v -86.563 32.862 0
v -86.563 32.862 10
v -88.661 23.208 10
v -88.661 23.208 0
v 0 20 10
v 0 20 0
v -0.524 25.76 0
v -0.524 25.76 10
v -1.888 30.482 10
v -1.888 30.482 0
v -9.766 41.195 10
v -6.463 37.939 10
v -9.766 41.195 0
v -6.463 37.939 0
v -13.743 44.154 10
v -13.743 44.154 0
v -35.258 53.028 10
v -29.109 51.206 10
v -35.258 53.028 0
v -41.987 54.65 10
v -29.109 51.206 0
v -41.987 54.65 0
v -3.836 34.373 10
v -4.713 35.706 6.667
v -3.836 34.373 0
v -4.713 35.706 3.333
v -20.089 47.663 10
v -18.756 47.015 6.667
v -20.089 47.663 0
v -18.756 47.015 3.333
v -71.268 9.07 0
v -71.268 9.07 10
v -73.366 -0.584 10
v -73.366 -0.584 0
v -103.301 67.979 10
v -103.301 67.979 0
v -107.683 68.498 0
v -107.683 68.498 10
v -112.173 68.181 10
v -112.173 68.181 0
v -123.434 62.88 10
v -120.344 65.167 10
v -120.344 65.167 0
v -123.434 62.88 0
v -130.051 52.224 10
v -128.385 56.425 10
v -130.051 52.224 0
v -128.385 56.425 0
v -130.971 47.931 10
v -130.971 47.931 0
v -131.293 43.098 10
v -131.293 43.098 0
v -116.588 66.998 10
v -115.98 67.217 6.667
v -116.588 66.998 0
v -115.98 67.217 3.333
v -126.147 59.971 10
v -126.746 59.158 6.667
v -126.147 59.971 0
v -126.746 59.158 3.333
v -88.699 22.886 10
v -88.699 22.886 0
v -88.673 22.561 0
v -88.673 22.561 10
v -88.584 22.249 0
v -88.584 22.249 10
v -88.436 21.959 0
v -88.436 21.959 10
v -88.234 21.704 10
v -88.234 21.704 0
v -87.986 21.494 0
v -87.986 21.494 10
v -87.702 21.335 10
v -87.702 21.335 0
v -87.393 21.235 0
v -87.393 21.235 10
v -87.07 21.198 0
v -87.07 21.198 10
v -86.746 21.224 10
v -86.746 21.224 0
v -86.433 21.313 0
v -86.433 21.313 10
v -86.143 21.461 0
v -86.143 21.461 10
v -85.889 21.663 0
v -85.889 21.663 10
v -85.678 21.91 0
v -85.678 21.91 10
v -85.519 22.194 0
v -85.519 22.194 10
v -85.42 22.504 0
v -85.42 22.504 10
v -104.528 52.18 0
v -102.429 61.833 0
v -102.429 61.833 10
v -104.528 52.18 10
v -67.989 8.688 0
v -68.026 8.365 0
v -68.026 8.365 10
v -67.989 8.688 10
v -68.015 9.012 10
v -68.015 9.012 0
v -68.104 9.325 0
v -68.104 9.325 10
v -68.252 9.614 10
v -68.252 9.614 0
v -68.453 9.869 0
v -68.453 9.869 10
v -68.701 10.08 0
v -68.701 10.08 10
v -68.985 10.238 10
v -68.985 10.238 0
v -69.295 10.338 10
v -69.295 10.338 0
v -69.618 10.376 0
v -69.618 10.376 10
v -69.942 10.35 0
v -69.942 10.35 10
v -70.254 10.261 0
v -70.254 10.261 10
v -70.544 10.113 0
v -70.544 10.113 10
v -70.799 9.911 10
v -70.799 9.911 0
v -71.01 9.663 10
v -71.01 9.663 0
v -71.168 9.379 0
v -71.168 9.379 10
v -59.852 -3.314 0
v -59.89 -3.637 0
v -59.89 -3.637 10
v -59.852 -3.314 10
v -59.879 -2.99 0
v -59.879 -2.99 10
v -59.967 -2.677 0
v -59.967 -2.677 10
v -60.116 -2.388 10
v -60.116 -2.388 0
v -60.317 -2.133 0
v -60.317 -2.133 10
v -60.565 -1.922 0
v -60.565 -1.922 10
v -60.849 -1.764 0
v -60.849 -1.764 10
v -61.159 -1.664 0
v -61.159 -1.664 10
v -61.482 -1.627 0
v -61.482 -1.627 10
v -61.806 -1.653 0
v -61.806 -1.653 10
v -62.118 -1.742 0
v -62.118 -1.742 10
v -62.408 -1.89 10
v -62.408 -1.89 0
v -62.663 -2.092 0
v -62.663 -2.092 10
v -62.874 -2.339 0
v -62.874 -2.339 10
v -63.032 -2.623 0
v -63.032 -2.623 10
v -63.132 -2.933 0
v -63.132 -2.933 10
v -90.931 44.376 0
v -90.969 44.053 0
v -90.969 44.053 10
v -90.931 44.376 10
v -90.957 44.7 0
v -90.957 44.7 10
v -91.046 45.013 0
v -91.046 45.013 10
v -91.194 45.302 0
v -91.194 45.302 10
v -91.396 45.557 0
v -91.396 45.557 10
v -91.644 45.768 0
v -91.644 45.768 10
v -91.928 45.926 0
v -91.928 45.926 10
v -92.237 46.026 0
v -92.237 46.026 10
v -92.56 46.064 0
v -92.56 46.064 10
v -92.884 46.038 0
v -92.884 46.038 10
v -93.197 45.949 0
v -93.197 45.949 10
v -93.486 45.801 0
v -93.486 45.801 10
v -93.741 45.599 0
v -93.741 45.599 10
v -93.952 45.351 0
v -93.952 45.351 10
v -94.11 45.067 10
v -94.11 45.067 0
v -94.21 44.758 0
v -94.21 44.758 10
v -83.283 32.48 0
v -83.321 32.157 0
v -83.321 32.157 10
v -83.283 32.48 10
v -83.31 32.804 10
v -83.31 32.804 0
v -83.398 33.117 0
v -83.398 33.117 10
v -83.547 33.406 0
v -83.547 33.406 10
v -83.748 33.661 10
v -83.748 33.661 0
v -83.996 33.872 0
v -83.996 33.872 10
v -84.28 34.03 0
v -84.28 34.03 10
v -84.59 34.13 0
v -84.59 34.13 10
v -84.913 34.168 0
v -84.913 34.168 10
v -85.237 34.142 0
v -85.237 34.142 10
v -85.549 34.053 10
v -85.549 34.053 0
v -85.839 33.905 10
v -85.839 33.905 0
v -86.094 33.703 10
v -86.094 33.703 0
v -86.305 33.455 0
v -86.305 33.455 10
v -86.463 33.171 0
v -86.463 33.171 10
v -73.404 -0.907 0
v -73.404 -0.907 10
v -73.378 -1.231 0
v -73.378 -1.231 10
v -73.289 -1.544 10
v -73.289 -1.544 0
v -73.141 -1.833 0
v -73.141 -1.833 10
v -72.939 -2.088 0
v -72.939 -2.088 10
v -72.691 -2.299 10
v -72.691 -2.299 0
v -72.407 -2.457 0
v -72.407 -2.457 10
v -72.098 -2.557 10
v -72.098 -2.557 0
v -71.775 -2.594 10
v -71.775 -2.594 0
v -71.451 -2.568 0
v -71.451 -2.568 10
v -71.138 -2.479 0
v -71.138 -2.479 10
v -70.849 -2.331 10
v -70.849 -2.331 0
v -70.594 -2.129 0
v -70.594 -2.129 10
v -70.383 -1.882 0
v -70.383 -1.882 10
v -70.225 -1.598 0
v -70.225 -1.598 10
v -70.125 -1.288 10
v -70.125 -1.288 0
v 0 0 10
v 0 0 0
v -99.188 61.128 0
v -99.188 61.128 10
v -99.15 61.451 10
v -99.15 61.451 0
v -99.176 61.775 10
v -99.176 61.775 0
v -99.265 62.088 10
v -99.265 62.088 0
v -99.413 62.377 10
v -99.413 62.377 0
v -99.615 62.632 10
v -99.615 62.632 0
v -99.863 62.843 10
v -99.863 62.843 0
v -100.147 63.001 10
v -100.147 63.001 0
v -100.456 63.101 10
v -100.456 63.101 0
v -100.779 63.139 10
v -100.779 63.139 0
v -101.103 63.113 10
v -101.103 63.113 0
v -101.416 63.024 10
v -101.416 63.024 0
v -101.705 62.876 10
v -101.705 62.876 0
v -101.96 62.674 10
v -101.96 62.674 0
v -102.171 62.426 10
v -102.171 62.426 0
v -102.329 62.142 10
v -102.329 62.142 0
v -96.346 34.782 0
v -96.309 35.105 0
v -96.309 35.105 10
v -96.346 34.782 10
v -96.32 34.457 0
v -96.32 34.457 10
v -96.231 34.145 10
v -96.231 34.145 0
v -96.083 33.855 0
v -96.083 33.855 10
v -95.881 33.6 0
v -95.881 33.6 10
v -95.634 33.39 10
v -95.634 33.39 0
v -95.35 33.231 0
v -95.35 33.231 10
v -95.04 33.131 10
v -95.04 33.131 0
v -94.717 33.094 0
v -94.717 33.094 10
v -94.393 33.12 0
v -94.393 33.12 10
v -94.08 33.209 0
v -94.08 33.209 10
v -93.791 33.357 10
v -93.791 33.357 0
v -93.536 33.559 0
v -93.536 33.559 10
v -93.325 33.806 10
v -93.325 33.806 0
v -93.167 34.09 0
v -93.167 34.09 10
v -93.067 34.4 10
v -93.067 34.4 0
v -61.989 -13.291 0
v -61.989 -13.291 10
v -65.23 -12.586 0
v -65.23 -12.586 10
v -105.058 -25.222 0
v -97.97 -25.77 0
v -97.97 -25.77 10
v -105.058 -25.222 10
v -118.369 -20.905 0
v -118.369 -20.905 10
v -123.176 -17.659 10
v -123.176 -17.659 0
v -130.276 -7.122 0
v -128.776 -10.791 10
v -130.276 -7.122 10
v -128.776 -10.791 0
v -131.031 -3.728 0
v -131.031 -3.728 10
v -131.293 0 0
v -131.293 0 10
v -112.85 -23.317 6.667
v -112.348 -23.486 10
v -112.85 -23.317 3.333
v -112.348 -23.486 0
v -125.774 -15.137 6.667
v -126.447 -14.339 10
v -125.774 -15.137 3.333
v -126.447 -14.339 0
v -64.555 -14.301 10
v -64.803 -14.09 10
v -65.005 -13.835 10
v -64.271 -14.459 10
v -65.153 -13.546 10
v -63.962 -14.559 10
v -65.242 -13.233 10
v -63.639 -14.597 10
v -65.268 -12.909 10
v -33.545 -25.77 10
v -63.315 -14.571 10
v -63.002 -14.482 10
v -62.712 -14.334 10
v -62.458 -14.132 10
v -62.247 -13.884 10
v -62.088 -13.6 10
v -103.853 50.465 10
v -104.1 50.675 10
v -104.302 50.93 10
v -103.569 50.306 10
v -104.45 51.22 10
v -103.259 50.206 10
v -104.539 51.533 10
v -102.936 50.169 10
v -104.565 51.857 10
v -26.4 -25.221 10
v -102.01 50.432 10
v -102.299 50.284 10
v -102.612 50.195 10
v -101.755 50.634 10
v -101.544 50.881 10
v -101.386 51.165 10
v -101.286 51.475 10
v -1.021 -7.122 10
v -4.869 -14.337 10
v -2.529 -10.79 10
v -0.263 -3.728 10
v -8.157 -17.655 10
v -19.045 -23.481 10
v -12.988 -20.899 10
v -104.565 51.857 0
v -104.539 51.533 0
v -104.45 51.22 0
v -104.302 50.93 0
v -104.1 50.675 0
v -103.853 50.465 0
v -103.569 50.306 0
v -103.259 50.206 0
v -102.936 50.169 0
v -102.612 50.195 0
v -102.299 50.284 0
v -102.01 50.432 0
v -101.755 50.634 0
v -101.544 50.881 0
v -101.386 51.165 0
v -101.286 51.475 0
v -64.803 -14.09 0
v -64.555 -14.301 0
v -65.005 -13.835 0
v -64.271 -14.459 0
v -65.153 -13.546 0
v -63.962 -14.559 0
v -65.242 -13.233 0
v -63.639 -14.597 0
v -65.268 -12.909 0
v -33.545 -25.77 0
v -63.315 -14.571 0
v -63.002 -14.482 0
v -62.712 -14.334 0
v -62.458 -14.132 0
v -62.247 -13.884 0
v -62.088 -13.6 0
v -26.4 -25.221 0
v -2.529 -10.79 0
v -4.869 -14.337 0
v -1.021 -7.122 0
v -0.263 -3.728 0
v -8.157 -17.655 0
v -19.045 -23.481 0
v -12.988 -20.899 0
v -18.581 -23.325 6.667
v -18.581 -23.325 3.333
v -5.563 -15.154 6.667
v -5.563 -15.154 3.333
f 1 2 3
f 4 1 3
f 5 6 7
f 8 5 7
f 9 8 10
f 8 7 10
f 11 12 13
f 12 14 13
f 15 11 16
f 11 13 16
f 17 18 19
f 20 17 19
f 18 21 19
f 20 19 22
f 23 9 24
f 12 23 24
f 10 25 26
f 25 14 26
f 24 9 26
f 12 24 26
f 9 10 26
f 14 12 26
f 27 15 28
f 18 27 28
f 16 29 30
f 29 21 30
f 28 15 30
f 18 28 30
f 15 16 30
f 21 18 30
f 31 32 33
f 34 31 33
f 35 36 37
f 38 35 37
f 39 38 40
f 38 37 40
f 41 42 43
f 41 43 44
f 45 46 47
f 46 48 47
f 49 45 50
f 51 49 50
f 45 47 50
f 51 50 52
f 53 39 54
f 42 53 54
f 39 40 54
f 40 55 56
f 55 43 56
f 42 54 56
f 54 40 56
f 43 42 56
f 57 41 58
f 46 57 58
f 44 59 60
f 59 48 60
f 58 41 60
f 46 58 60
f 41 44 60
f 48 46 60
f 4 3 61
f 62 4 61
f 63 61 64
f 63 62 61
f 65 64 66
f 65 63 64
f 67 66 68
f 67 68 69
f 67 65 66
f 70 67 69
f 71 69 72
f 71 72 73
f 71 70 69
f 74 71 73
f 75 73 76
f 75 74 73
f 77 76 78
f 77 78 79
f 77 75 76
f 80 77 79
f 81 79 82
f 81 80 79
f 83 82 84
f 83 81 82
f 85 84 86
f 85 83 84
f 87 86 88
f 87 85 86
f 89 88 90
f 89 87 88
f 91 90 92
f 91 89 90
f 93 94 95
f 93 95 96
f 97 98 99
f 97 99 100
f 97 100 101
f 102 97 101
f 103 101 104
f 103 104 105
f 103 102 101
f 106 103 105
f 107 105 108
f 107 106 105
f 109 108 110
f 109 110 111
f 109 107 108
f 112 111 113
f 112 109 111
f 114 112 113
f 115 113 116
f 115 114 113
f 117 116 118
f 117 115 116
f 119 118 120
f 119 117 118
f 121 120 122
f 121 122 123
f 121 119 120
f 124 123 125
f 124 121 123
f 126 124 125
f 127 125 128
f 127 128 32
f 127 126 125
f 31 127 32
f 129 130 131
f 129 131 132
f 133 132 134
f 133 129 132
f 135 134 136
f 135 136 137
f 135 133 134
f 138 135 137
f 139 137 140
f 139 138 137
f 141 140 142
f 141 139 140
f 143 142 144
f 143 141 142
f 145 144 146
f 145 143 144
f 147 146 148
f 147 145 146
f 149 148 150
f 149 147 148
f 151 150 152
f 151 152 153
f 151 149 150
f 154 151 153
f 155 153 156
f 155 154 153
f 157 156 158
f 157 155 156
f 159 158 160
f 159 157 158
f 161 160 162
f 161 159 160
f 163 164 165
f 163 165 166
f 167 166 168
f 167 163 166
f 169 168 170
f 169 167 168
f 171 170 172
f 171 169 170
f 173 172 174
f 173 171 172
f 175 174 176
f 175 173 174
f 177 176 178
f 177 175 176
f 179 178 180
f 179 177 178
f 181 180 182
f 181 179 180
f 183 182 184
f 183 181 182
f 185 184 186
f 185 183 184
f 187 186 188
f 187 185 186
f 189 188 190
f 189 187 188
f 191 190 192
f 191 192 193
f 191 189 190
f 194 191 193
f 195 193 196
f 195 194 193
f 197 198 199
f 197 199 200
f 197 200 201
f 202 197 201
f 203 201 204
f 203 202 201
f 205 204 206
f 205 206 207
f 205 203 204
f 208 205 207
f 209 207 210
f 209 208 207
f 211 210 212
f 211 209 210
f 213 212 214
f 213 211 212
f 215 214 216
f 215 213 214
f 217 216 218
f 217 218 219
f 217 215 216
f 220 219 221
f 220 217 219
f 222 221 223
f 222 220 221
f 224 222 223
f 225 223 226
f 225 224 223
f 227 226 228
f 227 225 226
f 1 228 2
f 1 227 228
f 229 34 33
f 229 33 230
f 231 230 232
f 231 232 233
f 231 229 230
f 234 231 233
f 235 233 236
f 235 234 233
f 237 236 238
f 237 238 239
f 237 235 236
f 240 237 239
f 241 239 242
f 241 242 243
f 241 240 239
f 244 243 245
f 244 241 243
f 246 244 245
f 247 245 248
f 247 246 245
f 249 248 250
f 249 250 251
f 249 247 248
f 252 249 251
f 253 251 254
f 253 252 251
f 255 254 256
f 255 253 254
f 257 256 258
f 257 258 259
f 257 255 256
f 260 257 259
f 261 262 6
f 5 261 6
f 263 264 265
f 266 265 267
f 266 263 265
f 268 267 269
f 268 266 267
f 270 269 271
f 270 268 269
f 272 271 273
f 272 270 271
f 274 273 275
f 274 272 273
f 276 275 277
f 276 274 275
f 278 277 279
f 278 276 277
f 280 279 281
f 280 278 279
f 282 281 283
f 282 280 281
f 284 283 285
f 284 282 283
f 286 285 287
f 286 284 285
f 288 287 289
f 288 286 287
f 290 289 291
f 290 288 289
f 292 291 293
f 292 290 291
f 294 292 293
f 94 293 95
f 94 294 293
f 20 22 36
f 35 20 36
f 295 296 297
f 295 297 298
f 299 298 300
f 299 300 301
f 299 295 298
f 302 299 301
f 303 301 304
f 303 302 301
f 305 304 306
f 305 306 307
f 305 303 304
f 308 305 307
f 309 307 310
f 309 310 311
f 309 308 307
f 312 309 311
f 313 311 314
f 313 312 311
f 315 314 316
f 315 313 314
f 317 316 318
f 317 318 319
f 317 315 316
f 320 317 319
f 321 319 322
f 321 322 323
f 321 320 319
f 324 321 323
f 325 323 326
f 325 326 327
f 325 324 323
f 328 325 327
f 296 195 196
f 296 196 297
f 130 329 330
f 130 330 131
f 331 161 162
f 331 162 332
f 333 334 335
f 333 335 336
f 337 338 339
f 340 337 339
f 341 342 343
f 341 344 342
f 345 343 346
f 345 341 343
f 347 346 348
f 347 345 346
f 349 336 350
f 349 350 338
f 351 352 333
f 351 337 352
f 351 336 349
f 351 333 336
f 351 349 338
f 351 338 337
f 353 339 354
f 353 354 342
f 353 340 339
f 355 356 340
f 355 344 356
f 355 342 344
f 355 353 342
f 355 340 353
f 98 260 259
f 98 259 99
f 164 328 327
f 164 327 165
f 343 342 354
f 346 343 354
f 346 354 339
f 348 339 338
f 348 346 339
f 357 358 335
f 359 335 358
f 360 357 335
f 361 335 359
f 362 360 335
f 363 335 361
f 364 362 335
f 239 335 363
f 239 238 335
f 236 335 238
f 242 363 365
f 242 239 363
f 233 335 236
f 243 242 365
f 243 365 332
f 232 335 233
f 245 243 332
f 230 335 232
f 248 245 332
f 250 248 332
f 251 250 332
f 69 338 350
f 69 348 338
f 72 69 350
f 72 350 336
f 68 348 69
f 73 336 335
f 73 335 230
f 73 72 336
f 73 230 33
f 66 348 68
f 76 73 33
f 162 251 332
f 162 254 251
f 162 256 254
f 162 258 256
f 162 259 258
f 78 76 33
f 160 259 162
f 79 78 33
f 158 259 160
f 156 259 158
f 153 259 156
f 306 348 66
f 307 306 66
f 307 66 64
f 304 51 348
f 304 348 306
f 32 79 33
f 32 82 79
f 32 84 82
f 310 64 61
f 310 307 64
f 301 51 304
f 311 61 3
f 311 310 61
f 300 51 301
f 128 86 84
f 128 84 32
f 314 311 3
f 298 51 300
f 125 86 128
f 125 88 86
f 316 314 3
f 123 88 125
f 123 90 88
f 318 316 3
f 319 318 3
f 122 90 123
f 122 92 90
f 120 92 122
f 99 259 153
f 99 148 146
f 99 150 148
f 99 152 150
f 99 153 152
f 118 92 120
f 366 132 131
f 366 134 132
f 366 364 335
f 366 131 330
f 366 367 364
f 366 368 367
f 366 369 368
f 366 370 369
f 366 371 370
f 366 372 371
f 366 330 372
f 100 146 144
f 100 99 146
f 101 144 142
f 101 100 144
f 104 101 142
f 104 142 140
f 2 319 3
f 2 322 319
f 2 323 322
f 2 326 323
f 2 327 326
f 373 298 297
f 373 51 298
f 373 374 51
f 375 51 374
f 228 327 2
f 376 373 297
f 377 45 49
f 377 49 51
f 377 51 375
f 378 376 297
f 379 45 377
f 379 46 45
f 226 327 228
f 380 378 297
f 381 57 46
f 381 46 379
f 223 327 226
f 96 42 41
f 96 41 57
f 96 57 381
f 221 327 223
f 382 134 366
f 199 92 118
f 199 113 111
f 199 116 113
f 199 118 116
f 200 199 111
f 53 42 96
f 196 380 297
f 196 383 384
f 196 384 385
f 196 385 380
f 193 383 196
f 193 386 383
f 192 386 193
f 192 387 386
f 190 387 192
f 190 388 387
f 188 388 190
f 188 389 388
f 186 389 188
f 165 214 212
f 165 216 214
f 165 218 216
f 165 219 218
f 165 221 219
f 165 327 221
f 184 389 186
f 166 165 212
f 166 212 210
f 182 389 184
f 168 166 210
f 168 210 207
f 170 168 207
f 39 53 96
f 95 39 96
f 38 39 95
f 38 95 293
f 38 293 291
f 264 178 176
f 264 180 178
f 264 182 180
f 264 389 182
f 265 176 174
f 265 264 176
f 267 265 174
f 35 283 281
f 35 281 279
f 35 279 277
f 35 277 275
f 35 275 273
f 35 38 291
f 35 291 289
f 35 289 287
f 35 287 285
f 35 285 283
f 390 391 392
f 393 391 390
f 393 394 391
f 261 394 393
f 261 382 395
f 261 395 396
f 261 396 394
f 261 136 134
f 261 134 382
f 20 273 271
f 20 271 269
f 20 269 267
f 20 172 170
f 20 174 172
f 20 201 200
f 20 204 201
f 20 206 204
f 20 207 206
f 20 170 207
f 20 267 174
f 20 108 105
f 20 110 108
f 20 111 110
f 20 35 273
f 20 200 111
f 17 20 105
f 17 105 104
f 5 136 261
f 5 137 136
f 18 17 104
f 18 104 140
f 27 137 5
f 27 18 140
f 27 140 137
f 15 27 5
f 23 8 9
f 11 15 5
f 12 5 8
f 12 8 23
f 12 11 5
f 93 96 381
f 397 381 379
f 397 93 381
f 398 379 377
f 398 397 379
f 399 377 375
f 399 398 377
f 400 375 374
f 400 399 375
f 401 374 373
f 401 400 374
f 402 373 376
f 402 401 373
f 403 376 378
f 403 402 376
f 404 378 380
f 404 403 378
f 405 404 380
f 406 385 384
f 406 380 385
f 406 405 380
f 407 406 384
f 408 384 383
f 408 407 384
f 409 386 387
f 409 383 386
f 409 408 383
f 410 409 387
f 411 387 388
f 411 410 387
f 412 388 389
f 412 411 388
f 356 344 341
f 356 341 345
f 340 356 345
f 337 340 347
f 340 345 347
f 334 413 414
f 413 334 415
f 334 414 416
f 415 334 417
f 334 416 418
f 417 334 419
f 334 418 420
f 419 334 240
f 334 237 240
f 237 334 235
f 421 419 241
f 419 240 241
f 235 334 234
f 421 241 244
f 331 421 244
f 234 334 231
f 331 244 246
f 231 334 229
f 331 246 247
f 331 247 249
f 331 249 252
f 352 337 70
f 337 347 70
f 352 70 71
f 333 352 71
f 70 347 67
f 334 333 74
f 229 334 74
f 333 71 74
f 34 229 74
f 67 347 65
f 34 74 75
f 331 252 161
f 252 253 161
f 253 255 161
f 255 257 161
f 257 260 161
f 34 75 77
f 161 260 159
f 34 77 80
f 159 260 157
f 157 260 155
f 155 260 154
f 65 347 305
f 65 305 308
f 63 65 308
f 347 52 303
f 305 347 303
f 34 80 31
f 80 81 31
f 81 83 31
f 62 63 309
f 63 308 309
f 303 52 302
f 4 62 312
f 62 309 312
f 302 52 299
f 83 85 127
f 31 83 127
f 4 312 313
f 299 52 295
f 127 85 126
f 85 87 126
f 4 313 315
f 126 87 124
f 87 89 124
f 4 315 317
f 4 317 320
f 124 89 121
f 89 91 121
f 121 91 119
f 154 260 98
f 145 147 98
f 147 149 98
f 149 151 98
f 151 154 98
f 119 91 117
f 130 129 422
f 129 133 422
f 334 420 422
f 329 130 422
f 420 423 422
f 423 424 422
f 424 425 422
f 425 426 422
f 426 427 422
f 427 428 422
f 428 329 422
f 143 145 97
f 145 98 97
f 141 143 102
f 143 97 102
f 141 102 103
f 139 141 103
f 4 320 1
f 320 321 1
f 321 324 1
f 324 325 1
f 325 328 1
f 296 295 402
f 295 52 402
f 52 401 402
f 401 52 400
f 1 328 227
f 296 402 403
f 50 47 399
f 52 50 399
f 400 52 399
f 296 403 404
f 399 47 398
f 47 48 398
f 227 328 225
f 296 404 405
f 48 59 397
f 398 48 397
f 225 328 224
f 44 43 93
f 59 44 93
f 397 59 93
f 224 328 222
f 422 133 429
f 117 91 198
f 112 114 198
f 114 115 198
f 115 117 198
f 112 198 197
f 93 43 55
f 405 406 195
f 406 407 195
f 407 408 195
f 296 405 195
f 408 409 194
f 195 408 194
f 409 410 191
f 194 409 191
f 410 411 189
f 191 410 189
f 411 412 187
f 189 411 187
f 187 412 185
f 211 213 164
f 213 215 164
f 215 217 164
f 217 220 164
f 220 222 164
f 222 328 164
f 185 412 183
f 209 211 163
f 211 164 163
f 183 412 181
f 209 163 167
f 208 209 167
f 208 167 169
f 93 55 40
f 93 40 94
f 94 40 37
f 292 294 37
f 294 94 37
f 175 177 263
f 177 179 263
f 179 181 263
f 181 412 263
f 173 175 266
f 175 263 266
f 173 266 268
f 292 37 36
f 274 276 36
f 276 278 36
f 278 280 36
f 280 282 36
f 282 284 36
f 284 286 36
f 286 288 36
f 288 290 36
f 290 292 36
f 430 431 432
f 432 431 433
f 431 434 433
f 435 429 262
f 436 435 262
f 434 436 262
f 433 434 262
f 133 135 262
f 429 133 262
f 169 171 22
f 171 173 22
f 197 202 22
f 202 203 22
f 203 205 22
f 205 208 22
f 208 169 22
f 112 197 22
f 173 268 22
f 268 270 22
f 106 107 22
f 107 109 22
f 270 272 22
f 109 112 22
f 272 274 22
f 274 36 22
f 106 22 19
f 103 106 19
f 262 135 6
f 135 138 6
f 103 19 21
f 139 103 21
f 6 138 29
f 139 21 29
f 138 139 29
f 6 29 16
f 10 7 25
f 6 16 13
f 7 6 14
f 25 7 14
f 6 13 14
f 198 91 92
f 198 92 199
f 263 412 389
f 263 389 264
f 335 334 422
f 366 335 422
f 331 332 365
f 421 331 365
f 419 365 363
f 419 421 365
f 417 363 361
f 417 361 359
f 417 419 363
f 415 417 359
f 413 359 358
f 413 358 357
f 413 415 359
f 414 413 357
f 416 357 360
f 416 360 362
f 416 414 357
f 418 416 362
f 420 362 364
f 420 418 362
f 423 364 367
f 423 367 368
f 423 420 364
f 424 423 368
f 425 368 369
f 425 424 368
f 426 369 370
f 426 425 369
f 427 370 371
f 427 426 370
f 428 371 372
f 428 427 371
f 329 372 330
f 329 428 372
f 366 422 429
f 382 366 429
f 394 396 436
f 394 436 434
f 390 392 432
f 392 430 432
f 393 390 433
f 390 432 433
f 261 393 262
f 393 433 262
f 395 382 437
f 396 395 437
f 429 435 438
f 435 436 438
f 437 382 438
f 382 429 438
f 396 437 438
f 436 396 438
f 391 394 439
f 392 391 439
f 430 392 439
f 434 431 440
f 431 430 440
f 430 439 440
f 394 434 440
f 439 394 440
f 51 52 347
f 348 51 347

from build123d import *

# Parameters (mm, degrees)
EXTRUDE_1_DEPTH     = 10
CUT_EXTRUDE_1_DEPTH = 149.427210809
OTHER_1_DEPTH       = 10


# Read off the part's stored shape, not the designer's step: Массив, управляемый таблицей1
with BuildPart() as part:
    # Эскиз1_fr → Бобышка-Вытянуть1 (new body)
    with BuildSketch(Plane.XY):
        with BuildLine():
            Line((0, 0), (0, 20))
            add(Edge.make_bspline(
                [(0, 20), (0, 38.146025899), (-14.209474182, 48.611098897), (-41.986949672, 54.649680525)],
                knots=[0, 0, 0, 0, 1, 1, 1, 1], degree=3))
            Line((-41.986949672, 54.649680525), (-103.301225383, 67.978870897))
            add(Edge.make_bspline(
                [(-103.301225383, 67.978870897), (-115.500001367, 70.63077872), (-131.292525164, 63.393306184), (-131.292525164, 43.097715536)],
                knots=[0, 0, 0, 0, 1, 1, 1, 1], degree=3))
            Line((-131.292525164, 43.097715536), (-131.292525164, 0))
            add(Edge.make_bspline(
                [(-97.969549234, -25.769768053), (-112.011160689, -25.769768053), (-131.292525164, -19.025155818), (-131.292525164, 0)],
                knots=[0, 0, 0, 0, 1, 1, 1, 1], degree=3))
            Line((-97.969549234, -25.769768053), (-33.545129103, -25.769768053))
            add(Edge.make_bspline(
                [(-33.545129103, -25.769768053), (-19.444866568, -25.769768053), (0, -19.063757455), (0, 0)],
                knots=[0, 0, 0, 0, 1, 1, 1, 1], degree=3))
        make_face()
    extrude(amount=EXTRUDE_1_DEPTH)

    # Эскиз2_fr → Вырез-Вытянуть1 (cut, through all)
    with BuildSketch(Plane(origin=(0, 0, 0), x_dir=(-1, 0, 0), z_dir=(0, 0, -1))):
        with BuildLine():
            Line((102.429251955, 61.832882372), (104.527789693, 52.179608775))
            ThreePointArc((104.527789693, 52.179608775), (103.259303337, 50.206407776), (101.286102339, 51.474894133))
            Line((101.286102339, 51.474894133), (99.1875646, 61.128167729))
            ThreePointArc((99.1875646, 61.128167729), (100.456050956, 63.101368728), (102.429251955, 61.832882372))
        make_face()
    extrude(amount=-CUT_EXTRUDE_1_DEPTH, mode=Mode.SUBTRACT)

    # Массив, управляемый таблицей1 outline → Массив, управляемый таблицей1 (cut)
    with BuildSketch(Plane.XY):
        with BuildLine():
            ThreePointArc((-59.89006563, -3.637341625), (-61.158551986, -1.664140626), (-63.131752985, -2.932626983))
            Line((-63.131752985, -2.932626983), (-65.230290724, -12.585900579))
            ThreePointArc((-65.230290724, -12.585900579), (-63.961804368, -14.559101578), (-61.988603369, -13.290615222))
            Line((-61.988603369, -13.290615222), (-59.89006563, -3.637341625))
        make_face()
        with BuildLine():
            ThreePointArc((-68.026121008, 8.36493328), (-69.294607365, 10.338134278), (-71.267808363, 9.069647922))
            Line((-71.267808363, 9.069647922), (-73.366346102, -0.583625675))
            ThreePointArc((-73.366346102, -0.583625675), (-72.097859745, -2.556826673), (-70.124658747, -1.288340317))
            Line((-70.124658747, -1.288340317), (-68.026121008, 8.36493328))
        make_face()
        with BuildLine():
            ThreePointArc((-83.3210554, 32.157053445), (-84.589541757, 34.130254443), (-86.562742755, 32.861768087))
            Line((-86.562742755, 32.861768087), (-88.661280493, 23.208494491))
            ThreePointArc((-88.661280493, 23.208494491), (-87.392794137, 21.235293492), (-85.419593138, 22.503779848))
            Line((-85.419593138, 22.503779848), (-83.3210554, 32.157053445))
        make_face()
        with BuildLine():
            ThreePointArc((-90.968522596, 44.053113527), (-92.237008952, 46.026314526), (-94.210209951, 44.75782817))
            Line((-94.210209951, 44.75782817), (-96.308747689, 35.104554573))
            ThreePointArc((-96.308747689, 35.104554573), (-95.040261333, 33.131353574), (-93.067060334, 34.399839931))
            Line((-93.067060334, 34.399839931), (-90.968522596, 44.053113527))
        make_face()
    extrude(amount=OTHER_1_DEPTH, mode=Mode.SUBTRACT)


solid = part.part
